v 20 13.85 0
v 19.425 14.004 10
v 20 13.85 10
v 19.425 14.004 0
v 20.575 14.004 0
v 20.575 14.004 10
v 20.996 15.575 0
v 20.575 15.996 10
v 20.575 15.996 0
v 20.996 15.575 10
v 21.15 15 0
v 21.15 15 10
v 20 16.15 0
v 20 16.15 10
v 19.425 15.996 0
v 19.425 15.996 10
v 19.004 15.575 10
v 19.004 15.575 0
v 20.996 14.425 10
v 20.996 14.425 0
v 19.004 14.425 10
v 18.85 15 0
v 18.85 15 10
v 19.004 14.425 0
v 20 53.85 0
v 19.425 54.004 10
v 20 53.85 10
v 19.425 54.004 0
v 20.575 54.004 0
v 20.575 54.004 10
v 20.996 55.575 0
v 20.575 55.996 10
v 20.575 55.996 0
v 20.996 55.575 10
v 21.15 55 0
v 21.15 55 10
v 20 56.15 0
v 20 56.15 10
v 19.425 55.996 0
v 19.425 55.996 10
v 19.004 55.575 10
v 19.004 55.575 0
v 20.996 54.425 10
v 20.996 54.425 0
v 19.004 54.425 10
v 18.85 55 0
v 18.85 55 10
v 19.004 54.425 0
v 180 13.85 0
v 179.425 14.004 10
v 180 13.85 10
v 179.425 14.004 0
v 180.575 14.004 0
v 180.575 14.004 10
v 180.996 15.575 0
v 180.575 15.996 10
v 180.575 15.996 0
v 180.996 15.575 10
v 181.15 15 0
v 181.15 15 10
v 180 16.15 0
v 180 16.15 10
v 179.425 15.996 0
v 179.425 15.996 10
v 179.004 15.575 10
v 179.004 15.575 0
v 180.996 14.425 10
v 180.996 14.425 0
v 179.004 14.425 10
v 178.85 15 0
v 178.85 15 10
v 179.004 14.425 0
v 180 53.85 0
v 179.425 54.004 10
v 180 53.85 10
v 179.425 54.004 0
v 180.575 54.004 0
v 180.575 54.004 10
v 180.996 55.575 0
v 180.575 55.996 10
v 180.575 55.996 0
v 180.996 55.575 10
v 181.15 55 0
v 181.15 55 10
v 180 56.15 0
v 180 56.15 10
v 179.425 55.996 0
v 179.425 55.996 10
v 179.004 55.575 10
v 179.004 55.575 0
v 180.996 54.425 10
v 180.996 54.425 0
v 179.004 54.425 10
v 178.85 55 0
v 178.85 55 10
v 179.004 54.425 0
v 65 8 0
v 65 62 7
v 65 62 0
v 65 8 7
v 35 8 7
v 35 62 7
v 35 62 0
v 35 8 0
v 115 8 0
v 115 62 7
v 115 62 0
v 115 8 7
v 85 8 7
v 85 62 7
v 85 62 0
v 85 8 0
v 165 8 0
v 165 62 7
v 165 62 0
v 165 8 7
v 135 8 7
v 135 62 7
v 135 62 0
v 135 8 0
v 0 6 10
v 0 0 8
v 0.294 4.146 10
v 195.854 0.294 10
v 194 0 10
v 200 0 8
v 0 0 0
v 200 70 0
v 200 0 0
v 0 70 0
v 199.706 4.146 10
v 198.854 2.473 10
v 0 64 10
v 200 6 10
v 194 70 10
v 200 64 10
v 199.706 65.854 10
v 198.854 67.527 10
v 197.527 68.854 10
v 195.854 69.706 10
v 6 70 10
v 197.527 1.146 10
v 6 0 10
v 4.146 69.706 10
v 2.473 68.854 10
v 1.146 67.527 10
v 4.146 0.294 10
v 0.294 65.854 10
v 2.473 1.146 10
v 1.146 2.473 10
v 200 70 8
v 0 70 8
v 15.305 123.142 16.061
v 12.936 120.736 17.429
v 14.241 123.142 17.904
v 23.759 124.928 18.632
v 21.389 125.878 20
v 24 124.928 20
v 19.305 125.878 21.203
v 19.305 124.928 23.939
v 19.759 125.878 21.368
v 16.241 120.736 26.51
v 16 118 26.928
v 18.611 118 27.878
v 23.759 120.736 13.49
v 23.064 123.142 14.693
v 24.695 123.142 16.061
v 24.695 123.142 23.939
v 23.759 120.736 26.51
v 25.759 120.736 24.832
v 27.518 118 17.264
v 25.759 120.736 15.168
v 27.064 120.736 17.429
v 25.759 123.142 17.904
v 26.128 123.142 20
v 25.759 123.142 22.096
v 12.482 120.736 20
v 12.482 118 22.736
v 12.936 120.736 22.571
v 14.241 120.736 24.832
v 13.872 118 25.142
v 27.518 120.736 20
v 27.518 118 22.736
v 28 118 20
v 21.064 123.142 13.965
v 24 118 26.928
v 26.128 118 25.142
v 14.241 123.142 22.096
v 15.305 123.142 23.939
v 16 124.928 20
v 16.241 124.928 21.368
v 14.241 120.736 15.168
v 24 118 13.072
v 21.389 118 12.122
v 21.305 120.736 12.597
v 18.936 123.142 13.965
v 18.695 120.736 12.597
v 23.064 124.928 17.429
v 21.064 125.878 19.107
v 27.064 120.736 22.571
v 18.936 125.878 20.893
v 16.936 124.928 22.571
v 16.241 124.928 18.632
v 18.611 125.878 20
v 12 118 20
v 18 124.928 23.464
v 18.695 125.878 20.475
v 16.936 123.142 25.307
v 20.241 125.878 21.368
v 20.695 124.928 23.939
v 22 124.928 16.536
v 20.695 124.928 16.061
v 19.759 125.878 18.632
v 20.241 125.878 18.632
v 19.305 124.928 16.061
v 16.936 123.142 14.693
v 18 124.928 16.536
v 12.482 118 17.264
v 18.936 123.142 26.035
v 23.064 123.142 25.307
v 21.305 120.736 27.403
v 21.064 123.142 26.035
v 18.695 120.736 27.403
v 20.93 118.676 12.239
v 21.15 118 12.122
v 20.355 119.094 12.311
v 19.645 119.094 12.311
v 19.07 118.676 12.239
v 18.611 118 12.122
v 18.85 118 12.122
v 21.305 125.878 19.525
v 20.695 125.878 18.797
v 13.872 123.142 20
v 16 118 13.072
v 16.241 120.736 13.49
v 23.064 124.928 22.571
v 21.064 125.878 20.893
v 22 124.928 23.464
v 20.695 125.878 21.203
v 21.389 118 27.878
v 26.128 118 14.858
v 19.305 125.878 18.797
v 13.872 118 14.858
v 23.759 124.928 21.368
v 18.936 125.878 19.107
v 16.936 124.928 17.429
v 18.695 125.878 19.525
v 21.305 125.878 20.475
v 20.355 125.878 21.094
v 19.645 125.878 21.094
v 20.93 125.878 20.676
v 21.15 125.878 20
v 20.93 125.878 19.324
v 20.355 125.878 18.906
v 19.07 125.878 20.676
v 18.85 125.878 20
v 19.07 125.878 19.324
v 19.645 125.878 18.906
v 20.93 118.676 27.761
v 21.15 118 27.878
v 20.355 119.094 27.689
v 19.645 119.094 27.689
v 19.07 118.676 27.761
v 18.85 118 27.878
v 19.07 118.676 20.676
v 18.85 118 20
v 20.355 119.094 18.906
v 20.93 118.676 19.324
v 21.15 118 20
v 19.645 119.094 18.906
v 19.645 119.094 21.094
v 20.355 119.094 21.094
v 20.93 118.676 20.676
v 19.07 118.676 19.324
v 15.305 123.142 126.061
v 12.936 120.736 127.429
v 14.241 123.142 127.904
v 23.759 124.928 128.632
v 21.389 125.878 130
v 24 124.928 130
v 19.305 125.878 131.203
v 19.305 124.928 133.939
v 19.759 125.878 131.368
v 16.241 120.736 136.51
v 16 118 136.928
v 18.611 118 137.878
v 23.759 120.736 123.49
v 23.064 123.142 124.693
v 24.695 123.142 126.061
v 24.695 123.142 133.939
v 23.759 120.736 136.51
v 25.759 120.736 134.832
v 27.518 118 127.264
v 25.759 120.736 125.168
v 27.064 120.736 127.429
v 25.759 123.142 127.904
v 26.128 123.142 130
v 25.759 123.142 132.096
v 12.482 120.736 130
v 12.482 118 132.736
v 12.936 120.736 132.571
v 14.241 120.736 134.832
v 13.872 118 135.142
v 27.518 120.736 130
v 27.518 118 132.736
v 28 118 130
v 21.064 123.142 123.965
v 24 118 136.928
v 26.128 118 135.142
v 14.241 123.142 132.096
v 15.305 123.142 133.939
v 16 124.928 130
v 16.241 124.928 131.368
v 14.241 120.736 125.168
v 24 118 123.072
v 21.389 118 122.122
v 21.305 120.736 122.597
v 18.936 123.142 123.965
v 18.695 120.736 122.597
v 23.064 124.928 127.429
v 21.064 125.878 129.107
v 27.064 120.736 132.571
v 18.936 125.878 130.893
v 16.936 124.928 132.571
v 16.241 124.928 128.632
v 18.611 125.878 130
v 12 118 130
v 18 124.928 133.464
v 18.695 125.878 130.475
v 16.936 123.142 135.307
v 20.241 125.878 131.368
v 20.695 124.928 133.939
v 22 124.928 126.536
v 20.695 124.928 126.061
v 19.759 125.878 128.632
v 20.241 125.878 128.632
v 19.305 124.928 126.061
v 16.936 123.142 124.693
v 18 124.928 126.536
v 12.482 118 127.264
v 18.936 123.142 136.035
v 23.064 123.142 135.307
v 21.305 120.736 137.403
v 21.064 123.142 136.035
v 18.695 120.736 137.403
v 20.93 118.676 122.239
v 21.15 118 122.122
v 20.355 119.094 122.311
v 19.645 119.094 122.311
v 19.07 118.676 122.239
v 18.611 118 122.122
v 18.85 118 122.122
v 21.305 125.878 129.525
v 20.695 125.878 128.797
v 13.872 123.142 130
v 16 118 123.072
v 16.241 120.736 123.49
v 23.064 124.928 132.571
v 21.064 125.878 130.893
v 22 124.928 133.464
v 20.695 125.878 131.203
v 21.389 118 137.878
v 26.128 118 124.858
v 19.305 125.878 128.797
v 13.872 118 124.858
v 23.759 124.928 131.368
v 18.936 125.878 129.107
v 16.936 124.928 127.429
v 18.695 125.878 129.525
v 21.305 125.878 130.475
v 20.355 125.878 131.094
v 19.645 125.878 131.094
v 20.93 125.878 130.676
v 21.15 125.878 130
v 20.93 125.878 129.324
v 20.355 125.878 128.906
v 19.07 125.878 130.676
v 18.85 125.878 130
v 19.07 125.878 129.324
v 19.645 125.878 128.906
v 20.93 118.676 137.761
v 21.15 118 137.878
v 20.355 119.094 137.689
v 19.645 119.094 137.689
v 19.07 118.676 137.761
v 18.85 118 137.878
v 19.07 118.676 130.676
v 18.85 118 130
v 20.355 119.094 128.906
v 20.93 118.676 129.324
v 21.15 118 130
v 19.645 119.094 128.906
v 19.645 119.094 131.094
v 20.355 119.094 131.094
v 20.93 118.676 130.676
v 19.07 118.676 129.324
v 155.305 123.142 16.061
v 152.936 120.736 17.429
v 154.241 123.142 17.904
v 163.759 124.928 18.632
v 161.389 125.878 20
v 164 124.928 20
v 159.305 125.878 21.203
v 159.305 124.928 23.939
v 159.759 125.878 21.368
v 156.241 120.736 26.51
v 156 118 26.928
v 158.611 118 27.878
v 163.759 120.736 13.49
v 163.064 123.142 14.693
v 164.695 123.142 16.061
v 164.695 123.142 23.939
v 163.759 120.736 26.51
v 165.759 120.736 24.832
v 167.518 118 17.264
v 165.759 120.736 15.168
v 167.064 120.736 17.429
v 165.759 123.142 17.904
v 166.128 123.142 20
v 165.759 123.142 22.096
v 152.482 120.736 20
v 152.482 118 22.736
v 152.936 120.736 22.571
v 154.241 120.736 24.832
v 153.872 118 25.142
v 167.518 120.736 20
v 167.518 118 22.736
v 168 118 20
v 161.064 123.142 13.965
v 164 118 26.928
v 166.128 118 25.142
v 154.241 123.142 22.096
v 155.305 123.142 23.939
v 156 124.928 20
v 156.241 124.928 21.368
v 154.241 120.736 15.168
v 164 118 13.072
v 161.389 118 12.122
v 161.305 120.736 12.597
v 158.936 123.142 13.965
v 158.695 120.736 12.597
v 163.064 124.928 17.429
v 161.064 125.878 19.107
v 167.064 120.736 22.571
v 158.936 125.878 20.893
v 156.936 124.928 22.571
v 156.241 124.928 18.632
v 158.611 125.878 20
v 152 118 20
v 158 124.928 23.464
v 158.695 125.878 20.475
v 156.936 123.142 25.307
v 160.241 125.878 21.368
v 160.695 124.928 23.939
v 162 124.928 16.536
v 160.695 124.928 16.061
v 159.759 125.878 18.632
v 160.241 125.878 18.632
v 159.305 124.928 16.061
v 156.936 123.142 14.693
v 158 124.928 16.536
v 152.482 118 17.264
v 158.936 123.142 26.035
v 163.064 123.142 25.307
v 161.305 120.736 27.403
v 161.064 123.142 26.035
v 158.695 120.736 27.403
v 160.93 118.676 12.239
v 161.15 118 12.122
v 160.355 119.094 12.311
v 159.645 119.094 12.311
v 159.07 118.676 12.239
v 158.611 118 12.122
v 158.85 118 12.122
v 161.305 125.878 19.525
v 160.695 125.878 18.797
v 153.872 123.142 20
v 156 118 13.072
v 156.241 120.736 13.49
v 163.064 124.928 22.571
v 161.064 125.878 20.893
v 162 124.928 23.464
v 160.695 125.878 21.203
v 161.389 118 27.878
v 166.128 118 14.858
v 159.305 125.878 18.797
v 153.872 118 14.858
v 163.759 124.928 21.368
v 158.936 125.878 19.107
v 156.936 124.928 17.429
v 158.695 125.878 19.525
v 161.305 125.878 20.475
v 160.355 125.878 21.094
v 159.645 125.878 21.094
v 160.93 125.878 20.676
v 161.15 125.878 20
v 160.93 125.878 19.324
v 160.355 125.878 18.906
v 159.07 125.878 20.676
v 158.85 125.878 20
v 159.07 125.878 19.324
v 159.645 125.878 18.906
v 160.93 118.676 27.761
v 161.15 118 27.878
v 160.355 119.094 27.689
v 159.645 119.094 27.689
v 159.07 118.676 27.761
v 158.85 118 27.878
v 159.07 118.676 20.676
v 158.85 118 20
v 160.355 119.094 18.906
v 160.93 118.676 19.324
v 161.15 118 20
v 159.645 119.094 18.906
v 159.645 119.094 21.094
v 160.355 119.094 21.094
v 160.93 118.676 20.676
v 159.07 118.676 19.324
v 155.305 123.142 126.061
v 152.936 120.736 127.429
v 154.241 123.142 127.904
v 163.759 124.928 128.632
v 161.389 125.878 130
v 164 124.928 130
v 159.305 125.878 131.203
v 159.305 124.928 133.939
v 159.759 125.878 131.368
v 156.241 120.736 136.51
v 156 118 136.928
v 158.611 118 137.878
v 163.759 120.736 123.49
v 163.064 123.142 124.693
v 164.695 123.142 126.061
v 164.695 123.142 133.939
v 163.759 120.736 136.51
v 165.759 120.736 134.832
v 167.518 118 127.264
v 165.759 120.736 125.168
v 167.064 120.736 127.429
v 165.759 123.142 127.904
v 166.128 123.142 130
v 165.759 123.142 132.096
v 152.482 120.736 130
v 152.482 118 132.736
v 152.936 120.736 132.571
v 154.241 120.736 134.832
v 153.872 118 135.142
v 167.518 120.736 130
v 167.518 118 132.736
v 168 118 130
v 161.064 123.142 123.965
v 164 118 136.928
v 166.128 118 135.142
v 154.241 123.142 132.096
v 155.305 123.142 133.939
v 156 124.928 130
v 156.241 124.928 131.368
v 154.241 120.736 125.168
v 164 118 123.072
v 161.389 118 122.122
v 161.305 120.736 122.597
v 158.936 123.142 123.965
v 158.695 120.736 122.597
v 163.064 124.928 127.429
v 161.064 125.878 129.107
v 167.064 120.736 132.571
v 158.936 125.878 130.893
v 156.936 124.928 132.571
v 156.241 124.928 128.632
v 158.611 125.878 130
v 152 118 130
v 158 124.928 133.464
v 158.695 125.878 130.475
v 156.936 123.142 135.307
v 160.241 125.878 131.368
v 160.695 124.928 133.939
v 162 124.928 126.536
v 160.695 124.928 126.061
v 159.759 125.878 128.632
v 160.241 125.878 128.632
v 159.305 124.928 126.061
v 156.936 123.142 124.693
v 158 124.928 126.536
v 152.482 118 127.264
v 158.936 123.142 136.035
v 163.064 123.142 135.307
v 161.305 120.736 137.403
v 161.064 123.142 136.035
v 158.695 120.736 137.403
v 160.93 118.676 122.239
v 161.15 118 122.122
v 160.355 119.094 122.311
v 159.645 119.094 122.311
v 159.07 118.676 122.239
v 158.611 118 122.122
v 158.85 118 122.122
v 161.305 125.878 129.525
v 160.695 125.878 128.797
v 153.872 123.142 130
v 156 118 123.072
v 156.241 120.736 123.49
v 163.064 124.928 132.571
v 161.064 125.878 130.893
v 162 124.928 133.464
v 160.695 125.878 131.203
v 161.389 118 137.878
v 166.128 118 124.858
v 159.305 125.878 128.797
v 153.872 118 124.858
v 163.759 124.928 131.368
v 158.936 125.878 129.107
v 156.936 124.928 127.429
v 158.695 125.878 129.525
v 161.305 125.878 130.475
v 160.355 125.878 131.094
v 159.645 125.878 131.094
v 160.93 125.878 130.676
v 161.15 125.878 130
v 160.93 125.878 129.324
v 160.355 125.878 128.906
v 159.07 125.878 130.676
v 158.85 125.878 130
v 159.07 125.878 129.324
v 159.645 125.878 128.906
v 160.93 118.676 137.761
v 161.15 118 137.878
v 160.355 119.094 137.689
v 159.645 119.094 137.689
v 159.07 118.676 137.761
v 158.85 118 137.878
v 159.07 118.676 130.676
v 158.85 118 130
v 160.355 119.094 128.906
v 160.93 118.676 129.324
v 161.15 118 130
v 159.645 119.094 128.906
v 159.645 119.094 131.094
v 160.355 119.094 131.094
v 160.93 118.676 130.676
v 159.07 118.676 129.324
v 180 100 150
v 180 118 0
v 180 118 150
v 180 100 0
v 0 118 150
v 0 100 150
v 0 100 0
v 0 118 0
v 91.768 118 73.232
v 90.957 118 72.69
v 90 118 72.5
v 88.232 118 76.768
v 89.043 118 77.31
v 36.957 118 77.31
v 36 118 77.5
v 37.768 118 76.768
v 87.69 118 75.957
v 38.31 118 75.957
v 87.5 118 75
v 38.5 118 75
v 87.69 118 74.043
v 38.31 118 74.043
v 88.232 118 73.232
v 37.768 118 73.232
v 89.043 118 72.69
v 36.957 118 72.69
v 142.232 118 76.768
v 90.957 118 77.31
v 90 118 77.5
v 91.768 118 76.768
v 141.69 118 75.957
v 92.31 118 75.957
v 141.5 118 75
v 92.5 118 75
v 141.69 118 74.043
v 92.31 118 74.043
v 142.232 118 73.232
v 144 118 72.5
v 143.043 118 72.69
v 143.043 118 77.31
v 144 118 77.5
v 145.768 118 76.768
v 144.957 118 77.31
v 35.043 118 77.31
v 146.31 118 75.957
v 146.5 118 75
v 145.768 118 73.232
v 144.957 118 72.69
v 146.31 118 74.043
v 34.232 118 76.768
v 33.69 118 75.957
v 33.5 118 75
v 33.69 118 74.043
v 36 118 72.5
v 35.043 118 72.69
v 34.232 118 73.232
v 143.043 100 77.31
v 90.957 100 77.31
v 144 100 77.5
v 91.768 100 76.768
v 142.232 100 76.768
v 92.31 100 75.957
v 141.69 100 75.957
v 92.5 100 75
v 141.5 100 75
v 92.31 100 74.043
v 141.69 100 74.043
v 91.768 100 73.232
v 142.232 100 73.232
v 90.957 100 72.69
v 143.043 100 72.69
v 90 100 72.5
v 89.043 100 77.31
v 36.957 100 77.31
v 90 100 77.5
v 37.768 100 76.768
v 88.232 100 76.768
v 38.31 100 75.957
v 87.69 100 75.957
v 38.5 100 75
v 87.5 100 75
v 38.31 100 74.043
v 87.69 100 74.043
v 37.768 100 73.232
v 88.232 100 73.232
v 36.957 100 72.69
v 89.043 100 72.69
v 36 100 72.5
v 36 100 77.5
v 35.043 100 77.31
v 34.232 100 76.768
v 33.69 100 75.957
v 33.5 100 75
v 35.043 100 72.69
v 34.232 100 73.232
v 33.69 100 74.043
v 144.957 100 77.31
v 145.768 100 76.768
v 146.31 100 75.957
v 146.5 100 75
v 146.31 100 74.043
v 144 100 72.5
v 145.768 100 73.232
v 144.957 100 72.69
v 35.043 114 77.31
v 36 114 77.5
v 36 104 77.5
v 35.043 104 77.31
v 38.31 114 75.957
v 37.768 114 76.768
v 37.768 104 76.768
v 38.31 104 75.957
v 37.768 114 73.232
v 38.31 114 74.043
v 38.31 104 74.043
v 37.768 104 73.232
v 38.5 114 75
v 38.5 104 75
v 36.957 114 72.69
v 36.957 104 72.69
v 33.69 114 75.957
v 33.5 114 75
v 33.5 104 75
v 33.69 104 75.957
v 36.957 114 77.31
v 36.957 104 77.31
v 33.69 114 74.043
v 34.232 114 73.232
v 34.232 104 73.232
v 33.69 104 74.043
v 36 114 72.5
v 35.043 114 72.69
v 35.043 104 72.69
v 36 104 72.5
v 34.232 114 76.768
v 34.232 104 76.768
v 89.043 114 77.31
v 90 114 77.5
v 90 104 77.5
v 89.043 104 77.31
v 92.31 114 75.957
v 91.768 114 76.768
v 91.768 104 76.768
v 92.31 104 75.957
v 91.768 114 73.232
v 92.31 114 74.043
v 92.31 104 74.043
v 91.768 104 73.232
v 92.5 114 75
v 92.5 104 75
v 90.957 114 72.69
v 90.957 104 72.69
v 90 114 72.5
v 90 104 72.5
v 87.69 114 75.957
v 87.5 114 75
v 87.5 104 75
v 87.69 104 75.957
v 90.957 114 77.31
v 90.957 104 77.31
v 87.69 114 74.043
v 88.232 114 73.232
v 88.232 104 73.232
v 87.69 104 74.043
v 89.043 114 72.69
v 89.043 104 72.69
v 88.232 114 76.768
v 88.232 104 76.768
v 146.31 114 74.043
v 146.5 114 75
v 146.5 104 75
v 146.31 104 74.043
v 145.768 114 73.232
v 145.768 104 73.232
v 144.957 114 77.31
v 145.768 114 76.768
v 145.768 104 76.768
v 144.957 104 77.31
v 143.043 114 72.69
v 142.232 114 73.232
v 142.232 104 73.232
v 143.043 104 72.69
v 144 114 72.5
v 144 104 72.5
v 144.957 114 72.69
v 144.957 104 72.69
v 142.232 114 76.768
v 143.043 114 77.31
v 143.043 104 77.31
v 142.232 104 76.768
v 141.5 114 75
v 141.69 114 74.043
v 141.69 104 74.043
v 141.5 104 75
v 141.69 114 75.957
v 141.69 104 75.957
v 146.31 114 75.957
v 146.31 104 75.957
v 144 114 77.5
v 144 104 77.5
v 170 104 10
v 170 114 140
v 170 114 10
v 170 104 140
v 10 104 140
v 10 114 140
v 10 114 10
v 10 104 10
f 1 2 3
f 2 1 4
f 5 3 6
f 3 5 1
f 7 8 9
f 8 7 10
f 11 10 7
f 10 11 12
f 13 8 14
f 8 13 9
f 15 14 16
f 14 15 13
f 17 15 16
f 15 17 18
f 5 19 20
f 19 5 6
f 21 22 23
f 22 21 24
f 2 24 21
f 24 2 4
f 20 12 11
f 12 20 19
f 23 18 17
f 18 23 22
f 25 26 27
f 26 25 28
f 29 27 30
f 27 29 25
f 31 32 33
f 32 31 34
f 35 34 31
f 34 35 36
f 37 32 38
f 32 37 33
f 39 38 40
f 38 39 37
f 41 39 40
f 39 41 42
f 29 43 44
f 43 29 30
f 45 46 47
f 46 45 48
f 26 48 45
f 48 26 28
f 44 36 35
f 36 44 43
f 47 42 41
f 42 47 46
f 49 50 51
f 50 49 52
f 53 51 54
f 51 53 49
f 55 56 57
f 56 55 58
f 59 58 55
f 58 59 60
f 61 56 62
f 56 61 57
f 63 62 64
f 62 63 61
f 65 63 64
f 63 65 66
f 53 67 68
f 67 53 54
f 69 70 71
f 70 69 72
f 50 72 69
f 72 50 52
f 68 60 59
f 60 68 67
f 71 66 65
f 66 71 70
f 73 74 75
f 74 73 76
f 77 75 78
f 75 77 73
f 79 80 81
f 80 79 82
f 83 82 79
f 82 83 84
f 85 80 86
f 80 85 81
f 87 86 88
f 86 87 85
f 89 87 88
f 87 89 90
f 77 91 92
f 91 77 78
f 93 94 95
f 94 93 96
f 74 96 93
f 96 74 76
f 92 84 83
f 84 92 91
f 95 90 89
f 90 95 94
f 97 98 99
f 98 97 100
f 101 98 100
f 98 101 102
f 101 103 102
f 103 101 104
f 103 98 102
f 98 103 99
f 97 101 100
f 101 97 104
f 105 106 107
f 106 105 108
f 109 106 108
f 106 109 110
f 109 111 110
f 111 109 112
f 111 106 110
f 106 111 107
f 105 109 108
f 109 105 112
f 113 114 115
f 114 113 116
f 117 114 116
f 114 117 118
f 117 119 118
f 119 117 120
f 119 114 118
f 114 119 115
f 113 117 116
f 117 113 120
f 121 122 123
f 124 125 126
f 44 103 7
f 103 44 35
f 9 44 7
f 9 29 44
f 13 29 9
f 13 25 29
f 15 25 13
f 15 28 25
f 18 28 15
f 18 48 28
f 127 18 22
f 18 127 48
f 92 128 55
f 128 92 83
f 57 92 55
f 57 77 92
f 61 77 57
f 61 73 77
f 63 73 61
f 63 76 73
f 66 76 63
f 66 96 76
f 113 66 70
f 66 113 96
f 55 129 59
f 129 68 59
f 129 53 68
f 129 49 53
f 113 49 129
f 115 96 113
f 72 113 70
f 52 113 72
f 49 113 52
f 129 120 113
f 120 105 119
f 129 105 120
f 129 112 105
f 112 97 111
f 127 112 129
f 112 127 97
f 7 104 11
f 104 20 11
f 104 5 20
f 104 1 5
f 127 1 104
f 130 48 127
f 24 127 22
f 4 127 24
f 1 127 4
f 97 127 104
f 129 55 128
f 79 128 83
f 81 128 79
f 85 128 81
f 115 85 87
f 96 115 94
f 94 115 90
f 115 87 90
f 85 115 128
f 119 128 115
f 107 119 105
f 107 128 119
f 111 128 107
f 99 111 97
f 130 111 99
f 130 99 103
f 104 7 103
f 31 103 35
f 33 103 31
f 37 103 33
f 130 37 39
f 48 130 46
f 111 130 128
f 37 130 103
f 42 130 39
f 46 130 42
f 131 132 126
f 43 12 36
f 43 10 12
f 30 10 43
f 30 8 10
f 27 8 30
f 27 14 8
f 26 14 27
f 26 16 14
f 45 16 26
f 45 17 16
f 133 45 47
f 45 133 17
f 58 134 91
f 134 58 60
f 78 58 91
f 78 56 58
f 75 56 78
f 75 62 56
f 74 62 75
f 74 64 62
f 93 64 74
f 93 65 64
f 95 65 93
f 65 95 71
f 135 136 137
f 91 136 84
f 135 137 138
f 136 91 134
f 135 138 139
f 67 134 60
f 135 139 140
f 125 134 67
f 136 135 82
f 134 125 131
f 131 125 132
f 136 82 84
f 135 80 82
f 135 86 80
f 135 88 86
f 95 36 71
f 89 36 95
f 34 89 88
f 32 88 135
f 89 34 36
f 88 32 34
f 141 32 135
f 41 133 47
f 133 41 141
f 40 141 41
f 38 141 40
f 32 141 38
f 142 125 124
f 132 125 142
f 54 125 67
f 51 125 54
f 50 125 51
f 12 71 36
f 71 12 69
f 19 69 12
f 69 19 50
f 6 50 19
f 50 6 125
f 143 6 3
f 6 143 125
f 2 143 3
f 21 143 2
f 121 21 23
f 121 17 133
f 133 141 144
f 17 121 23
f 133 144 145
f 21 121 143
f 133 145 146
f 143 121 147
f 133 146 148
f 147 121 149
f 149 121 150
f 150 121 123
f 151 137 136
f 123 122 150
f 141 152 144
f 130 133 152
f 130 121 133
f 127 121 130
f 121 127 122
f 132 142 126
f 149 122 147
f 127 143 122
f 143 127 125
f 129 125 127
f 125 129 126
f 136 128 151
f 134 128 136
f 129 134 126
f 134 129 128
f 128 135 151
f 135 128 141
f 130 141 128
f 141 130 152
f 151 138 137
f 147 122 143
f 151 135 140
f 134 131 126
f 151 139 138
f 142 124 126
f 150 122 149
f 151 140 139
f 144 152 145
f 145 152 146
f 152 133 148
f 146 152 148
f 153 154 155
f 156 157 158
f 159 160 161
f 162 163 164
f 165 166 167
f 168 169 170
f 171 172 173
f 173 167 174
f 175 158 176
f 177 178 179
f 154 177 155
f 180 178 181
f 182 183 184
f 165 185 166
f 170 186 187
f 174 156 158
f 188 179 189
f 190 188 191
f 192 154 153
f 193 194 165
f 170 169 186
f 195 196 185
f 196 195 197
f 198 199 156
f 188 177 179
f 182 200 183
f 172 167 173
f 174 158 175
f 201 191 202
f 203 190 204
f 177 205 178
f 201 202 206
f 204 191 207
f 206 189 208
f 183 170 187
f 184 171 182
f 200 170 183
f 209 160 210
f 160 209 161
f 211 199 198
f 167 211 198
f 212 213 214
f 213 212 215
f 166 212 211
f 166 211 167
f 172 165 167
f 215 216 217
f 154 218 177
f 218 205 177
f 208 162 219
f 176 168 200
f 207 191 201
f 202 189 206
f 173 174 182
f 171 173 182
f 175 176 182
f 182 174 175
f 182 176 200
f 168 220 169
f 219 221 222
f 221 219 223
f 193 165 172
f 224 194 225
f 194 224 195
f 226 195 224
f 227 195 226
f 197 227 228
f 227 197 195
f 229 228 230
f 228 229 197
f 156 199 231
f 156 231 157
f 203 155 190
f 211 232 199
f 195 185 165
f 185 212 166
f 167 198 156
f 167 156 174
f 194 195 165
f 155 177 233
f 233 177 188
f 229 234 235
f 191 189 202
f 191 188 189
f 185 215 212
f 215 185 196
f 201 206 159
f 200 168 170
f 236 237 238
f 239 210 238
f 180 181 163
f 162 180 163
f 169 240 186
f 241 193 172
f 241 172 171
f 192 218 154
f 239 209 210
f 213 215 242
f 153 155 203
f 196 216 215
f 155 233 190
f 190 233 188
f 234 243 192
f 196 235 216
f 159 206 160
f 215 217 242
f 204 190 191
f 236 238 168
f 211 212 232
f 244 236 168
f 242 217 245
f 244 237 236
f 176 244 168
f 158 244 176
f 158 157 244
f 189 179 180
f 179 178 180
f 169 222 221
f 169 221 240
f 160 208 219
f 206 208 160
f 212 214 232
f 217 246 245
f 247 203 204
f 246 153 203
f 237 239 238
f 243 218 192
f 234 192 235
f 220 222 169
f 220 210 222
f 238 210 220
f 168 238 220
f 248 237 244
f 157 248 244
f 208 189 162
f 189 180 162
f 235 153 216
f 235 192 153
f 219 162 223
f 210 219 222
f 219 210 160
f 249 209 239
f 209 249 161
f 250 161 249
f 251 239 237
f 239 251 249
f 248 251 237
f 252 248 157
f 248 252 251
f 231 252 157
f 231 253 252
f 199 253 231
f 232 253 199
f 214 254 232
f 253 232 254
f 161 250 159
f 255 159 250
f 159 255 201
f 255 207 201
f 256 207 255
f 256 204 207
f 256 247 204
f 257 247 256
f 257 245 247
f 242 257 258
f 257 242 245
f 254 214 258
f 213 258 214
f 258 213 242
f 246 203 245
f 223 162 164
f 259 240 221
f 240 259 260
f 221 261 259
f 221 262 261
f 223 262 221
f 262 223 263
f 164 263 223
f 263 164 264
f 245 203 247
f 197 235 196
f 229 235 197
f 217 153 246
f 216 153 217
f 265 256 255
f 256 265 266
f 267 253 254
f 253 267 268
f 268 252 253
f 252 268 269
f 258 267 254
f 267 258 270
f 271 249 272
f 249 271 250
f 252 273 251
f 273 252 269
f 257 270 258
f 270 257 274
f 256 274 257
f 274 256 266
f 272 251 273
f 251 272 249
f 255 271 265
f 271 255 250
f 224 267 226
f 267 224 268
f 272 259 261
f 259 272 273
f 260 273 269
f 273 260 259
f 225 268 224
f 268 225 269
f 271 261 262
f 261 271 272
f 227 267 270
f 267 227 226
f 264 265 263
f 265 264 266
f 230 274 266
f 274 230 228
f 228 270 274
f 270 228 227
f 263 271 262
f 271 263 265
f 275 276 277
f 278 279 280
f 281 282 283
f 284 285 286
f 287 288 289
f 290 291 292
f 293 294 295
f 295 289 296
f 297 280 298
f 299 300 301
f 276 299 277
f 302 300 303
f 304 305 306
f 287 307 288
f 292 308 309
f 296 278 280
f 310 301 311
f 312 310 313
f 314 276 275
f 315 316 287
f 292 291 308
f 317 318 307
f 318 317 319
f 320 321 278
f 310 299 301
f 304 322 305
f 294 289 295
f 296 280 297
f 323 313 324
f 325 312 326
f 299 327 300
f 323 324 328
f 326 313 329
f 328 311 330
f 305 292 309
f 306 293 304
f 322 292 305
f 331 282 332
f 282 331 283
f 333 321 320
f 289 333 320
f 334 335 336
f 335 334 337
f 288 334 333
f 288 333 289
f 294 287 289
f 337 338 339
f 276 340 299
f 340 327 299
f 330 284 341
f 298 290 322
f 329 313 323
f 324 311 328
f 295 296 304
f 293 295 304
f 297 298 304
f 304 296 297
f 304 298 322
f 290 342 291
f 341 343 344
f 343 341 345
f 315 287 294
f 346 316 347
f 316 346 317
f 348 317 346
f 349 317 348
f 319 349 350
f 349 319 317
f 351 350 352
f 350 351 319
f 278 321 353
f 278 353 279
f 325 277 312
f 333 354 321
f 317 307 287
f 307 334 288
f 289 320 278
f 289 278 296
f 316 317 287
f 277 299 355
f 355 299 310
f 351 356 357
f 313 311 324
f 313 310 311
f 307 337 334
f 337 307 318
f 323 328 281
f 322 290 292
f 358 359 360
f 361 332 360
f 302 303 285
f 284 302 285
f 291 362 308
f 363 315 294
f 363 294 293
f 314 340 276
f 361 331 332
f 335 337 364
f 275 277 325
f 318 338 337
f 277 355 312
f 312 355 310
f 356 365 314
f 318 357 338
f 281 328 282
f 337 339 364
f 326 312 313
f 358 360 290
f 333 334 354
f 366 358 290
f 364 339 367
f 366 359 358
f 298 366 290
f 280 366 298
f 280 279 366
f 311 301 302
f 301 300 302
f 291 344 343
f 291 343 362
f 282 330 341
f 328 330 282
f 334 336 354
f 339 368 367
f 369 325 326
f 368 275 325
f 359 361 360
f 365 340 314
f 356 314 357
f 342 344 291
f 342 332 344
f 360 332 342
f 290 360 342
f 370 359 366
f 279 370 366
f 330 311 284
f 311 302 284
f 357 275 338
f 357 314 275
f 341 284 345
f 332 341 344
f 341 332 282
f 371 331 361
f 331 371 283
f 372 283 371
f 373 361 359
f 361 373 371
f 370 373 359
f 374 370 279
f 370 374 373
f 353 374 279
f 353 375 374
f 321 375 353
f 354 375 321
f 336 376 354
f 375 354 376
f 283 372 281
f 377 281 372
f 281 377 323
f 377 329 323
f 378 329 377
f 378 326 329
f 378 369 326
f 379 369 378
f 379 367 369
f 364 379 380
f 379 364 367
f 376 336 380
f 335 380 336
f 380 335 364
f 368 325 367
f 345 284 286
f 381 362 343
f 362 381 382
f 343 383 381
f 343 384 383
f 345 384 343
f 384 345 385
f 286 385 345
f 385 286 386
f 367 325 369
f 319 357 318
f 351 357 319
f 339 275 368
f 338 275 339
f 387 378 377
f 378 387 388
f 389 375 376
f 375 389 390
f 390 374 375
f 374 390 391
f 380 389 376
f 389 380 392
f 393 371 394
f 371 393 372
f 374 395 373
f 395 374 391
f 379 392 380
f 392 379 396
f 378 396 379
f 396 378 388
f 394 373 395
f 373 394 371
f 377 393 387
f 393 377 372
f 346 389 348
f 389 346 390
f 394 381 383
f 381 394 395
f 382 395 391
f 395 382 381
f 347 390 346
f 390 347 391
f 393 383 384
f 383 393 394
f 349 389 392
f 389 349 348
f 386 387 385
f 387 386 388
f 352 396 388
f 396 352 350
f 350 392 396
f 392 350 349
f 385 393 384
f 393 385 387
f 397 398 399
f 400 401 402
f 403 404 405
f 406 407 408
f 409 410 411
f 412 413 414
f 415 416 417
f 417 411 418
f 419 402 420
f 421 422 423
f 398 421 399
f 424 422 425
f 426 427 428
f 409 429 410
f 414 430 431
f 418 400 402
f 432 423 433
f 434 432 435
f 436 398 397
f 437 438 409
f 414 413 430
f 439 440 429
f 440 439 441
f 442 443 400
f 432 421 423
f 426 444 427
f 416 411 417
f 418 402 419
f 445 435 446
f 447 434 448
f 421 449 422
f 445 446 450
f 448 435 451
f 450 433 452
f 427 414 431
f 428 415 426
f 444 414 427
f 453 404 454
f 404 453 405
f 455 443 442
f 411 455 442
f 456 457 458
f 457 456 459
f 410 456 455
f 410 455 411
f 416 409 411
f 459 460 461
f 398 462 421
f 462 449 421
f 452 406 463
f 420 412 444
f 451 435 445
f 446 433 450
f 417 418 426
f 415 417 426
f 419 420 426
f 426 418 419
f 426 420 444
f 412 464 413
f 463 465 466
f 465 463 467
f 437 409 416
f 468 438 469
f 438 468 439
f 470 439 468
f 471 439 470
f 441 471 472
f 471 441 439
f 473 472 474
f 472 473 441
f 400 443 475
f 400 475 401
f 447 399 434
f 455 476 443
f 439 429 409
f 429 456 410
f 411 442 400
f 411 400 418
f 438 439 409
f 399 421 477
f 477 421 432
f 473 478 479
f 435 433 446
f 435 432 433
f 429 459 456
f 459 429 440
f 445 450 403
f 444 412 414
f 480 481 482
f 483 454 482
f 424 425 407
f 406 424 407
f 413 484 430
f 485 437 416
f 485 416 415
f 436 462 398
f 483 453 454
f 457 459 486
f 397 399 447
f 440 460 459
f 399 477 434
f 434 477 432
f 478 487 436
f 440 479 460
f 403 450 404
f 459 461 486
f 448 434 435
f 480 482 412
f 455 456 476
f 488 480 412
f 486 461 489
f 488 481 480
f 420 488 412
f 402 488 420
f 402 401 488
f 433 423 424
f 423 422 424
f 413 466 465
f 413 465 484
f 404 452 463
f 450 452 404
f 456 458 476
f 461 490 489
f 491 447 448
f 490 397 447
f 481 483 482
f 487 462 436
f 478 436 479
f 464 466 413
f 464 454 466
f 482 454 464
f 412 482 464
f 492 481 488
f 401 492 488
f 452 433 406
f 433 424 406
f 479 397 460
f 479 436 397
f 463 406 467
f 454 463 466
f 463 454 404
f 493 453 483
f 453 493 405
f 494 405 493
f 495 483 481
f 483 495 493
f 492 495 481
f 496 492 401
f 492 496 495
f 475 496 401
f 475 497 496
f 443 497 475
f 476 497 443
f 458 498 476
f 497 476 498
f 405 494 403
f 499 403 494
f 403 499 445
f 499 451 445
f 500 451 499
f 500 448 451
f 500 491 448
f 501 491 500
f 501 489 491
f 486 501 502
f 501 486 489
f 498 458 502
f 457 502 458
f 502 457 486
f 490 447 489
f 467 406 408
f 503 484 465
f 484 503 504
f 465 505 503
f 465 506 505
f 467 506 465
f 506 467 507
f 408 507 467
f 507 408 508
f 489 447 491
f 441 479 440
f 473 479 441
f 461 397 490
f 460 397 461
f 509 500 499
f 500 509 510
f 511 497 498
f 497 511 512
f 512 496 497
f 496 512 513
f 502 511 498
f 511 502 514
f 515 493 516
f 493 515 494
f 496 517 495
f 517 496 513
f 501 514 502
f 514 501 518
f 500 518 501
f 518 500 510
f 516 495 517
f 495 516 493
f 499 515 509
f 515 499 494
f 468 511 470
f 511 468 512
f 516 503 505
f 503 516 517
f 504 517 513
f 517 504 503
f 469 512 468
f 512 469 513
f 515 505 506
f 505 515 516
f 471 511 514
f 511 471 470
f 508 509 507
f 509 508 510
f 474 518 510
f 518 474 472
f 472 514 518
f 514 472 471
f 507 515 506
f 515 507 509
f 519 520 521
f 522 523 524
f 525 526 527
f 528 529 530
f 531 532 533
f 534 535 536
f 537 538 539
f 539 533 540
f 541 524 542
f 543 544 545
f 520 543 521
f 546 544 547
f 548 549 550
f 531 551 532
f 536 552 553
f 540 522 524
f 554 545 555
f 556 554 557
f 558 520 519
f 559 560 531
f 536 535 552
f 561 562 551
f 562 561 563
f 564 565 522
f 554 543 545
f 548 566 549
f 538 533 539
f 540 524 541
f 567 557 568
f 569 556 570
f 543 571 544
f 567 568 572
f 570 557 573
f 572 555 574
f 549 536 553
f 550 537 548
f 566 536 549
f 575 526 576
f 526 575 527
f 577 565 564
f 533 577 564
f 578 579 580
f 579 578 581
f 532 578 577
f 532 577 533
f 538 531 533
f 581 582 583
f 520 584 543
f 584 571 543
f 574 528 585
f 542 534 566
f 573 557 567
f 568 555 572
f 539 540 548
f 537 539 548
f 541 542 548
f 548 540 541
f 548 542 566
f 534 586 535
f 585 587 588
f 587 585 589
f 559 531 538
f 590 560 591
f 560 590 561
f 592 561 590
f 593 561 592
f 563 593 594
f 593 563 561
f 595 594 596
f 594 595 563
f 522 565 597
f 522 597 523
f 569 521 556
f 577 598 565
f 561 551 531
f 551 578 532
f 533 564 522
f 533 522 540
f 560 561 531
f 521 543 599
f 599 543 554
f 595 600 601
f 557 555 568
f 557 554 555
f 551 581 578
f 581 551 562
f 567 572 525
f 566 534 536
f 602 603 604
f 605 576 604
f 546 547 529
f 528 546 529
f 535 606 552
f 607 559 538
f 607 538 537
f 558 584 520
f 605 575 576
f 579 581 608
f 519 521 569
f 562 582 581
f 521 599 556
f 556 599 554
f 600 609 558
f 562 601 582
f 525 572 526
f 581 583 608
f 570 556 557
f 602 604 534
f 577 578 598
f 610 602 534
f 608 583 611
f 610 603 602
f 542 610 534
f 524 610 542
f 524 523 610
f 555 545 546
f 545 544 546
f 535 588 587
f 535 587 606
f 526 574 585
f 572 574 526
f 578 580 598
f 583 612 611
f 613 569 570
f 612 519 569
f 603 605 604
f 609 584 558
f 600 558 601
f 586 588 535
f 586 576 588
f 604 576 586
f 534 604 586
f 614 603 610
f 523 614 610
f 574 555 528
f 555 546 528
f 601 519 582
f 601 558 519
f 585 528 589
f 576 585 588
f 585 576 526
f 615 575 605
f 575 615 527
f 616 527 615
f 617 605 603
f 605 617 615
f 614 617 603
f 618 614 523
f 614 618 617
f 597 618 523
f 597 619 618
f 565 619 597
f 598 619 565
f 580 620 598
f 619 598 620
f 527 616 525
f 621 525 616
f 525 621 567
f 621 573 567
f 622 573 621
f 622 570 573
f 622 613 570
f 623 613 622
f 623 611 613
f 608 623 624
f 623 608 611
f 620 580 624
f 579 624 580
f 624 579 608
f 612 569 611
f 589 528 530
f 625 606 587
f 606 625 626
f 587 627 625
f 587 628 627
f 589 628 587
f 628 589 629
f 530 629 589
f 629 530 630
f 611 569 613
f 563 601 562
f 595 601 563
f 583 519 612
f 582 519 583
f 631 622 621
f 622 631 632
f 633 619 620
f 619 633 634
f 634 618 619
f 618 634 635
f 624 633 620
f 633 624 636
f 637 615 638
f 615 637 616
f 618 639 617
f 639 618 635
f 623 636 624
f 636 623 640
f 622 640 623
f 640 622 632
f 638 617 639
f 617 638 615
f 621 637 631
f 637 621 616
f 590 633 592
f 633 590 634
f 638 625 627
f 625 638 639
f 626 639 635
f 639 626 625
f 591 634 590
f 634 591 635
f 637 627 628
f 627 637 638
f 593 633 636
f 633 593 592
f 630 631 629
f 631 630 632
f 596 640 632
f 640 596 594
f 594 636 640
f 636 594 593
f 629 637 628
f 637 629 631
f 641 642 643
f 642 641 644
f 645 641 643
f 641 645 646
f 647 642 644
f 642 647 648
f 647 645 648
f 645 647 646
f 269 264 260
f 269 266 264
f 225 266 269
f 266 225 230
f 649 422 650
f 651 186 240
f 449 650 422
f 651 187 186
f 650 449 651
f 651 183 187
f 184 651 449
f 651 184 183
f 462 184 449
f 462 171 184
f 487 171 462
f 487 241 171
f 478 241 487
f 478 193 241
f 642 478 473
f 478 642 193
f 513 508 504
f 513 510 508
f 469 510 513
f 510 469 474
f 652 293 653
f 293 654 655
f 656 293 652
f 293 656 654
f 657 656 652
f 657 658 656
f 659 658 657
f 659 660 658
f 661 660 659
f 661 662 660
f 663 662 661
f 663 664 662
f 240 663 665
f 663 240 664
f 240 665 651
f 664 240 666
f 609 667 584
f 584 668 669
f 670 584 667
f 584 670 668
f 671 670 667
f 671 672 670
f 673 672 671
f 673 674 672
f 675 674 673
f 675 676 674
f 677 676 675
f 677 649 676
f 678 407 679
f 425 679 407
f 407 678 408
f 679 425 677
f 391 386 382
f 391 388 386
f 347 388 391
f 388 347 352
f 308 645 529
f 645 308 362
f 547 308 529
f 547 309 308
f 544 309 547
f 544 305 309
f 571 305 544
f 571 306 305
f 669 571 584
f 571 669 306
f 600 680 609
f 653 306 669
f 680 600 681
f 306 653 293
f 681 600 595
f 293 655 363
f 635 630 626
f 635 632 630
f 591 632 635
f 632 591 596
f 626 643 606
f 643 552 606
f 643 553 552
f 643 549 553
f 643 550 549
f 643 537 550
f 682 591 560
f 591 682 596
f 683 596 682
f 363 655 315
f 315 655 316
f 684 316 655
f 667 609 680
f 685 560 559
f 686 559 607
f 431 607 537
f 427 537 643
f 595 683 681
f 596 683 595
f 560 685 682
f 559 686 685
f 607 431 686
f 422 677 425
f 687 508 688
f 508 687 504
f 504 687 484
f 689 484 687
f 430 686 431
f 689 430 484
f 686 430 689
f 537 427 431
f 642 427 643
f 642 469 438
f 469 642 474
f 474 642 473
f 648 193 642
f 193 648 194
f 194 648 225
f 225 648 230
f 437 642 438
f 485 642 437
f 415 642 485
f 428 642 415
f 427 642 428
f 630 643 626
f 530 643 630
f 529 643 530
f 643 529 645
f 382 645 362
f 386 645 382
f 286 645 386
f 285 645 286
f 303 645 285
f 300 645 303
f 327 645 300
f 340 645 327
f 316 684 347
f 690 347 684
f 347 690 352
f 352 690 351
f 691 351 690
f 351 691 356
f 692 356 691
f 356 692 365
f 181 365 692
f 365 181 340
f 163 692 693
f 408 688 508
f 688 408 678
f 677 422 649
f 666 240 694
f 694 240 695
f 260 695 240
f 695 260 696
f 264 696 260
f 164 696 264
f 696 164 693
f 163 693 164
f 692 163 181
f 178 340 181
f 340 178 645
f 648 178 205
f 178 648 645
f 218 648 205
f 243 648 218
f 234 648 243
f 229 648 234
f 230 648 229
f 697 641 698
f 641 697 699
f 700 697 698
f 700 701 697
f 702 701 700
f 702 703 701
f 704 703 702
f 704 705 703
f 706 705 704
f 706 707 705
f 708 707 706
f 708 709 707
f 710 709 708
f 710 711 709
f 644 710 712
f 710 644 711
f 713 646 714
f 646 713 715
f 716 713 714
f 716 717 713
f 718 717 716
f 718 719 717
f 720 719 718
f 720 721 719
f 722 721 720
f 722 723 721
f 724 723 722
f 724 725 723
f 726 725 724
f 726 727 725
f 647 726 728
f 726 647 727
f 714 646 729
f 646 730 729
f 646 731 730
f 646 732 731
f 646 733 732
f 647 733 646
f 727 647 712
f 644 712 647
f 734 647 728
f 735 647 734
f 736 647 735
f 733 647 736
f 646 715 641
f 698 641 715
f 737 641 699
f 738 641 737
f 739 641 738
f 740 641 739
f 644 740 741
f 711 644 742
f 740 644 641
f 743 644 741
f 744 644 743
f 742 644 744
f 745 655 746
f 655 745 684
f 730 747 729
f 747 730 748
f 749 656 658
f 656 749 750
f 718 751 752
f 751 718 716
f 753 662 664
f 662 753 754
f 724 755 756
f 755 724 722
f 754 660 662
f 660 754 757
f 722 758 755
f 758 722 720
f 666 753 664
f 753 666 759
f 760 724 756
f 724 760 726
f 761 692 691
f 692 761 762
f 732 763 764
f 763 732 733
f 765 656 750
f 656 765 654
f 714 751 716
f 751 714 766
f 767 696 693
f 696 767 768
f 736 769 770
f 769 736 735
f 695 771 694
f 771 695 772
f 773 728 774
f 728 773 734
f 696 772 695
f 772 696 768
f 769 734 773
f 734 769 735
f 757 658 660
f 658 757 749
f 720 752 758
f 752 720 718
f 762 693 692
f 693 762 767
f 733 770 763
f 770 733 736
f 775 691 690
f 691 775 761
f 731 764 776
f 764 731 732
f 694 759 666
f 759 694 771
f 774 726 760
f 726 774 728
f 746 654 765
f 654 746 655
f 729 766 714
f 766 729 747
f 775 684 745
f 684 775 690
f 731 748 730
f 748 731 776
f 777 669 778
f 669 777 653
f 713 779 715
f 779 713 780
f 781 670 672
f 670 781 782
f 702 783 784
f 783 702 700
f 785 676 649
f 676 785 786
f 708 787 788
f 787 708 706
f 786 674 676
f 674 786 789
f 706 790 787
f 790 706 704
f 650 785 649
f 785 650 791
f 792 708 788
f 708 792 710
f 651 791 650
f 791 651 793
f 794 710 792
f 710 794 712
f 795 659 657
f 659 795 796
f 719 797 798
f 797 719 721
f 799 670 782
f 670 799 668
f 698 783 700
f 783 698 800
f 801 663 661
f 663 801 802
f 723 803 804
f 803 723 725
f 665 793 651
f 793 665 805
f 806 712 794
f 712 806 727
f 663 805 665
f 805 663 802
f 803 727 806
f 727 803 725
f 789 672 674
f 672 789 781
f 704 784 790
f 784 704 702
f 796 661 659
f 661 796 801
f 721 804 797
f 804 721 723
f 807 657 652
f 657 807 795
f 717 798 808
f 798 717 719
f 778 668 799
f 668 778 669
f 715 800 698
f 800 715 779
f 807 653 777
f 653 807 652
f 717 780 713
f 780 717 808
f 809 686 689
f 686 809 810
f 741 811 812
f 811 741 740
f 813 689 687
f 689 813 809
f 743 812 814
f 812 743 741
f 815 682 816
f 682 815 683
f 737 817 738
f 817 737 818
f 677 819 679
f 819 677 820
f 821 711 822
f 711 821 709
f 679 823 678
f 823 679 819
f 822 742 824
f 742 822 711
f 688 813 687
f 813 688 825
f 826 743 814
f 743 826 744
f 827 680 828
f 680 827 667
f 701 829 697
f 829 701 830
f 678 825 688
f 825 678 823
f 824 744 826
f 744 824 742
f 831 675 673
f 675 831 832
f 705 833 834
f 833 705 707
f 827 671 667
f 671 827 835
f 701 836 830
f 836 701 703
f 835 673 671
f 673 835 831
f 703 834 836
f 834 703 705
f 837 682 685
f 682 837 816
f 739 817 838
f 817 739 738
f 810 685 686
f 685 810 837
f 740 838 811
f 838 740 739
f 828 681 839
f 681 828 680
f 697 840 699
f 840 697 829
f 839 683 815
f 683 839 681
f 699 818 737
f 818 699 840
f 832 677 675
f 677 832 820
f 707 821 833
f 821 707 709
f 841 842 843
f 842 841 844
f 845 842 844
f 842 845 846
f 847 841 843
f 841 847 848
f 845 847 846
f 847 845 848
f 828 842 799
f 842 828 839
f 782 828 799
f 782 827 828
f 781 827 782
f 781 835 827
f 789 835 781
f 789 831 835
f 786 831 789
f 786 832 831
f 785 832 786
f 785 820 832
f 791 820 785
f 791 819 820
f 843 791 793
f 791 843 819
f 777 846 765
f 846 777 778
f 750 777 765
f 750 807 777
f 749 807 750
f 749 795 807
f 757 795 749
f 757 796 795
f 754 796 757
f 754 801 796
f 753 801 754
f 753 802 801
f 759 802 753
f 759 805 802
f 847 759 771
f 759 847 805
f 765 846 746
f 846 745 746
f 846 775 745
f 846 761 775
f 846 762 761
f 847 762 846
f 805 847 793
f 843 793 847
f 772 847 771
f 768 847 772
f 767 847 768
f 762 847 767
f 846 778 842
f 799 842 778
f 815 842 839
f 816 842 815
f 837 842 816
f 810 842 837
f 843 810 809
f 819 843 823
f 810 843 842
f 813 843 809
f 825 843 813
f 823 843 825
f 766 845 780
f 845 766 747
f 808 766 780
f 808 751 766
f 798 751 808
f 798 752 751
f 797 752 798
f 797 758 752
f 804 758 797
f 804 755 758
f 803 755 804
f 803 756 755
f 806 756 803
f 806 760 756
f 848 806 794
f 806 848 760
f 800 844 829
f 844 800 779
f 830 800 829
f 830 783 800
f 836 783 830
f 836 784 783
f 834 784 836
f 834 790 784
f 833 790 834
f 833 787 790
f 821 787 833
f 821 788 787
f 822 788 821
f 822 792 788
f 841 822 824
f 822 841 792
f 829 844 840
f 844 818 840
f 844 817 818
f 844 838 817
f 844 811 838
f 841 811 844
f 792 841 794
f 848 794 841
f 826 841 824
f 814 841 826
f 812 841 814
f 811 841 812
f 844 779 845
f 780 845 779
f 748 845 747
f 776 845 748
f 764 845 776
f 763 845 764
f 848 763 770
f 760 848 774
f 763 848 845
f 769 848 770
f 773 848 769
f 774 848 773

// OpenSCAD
// Tensegrity Floating Shelf — Wall Art + Functional Shelf
// Appears to defy gravity; holds ~500g of small items
// DUAL COLOR: shelf + wall bracket (dark) | tension nodes (bright)
// Hardware: 4x 1.5mm steel cable + ferrules (crimped)
// PETG — 0.2mm, 4 walls, 25% infill (needs strength)

SHELF_W  = 200;
SHELF_D  = 70;
SHELF_H  = 12;
BRKT_W   = 180;
BRKT_H   = 150;
BRKT_D   = 18;
CABLE_D  = 2.0;    // 1.5mm cable + tolerance
NODE_D   = 16;
WALL     = 4.0;
R        = 6;

// ── Floating shelf ───────────────────────────────────
module shelf() {
    difference() {
        hull() {
            cube([SHELF_W, SHELF_D, SHELF_H - 4]);
            translate([R, R, SHELF_H - 4])
                minkowski() {
                    cube([SHELF_W - R*2, SHELF_D - R*2, 1]);
                    cylinder(r = R, h = 1, $fn = 20);
                }
        }
        // Cable holes (4, near corners)
        for (x = [20, SHELF_W - 20], y = [15, SHELF_D - 15])
            translate([x, y, -1])
                cylinder(d = CABLE_D + 0.3, h = SHELF_H + 2, $fn = 12);
        // Lightweight rib cutouts (underside)
        for (i = [1:3])
            translate([SHELF_W * i/4 - 15, 8, -1])
                cube([30, SHELF_D - 16, SHELF_H - 4]);
    }
}

// ── Wall bracket ─────────────────────────────────────
module wall_bracket() {
    difference() {
        union() {
            // Back plate (mounts to wall)
            cube([BRKT_W, BRKT_D, BRKT_H]);
            // Cable anchor nodes (4 points)
            for (x = [20, BRKT_W - 20], z = [20, BRKT_H - 20])
                translate([x, BRKT_D, z])
                    rotate([-90, 0, 0])
                        difference() {
                            sphere(d = NODE_D, $fn = 18);
                            cylinder(d = CABLE_D + 0.3, h = NODE_D + 1,
                                     center = true, $fn = 10);
                            rotate([90, 0, 0])
                                cylinder(d = CABLE_D + 0.3, h = NODE_D + 1,
                                         center = true, $fn = 10);
                        }
        }
        // Wall screw holes
        for (x = [BRKT_W * 0.2, BRKT_W * 0.5, BRKT_W * 0.8])
            translate([x, -1, BRKT_H/2])
                rotate([-90, 0, 0])
                    cylinder(d = 5, h = BRKT_D + 2, $fn = 16);
        // Weight reduction pockets
        translate([10, 4, 10])
            cube([BRKT_W - 20, BRKT_D - 8, BRKT_H - 20]);
    }
}

shelf();
translate([0, SHELF_D + 30, 0]) wall_bracket();
